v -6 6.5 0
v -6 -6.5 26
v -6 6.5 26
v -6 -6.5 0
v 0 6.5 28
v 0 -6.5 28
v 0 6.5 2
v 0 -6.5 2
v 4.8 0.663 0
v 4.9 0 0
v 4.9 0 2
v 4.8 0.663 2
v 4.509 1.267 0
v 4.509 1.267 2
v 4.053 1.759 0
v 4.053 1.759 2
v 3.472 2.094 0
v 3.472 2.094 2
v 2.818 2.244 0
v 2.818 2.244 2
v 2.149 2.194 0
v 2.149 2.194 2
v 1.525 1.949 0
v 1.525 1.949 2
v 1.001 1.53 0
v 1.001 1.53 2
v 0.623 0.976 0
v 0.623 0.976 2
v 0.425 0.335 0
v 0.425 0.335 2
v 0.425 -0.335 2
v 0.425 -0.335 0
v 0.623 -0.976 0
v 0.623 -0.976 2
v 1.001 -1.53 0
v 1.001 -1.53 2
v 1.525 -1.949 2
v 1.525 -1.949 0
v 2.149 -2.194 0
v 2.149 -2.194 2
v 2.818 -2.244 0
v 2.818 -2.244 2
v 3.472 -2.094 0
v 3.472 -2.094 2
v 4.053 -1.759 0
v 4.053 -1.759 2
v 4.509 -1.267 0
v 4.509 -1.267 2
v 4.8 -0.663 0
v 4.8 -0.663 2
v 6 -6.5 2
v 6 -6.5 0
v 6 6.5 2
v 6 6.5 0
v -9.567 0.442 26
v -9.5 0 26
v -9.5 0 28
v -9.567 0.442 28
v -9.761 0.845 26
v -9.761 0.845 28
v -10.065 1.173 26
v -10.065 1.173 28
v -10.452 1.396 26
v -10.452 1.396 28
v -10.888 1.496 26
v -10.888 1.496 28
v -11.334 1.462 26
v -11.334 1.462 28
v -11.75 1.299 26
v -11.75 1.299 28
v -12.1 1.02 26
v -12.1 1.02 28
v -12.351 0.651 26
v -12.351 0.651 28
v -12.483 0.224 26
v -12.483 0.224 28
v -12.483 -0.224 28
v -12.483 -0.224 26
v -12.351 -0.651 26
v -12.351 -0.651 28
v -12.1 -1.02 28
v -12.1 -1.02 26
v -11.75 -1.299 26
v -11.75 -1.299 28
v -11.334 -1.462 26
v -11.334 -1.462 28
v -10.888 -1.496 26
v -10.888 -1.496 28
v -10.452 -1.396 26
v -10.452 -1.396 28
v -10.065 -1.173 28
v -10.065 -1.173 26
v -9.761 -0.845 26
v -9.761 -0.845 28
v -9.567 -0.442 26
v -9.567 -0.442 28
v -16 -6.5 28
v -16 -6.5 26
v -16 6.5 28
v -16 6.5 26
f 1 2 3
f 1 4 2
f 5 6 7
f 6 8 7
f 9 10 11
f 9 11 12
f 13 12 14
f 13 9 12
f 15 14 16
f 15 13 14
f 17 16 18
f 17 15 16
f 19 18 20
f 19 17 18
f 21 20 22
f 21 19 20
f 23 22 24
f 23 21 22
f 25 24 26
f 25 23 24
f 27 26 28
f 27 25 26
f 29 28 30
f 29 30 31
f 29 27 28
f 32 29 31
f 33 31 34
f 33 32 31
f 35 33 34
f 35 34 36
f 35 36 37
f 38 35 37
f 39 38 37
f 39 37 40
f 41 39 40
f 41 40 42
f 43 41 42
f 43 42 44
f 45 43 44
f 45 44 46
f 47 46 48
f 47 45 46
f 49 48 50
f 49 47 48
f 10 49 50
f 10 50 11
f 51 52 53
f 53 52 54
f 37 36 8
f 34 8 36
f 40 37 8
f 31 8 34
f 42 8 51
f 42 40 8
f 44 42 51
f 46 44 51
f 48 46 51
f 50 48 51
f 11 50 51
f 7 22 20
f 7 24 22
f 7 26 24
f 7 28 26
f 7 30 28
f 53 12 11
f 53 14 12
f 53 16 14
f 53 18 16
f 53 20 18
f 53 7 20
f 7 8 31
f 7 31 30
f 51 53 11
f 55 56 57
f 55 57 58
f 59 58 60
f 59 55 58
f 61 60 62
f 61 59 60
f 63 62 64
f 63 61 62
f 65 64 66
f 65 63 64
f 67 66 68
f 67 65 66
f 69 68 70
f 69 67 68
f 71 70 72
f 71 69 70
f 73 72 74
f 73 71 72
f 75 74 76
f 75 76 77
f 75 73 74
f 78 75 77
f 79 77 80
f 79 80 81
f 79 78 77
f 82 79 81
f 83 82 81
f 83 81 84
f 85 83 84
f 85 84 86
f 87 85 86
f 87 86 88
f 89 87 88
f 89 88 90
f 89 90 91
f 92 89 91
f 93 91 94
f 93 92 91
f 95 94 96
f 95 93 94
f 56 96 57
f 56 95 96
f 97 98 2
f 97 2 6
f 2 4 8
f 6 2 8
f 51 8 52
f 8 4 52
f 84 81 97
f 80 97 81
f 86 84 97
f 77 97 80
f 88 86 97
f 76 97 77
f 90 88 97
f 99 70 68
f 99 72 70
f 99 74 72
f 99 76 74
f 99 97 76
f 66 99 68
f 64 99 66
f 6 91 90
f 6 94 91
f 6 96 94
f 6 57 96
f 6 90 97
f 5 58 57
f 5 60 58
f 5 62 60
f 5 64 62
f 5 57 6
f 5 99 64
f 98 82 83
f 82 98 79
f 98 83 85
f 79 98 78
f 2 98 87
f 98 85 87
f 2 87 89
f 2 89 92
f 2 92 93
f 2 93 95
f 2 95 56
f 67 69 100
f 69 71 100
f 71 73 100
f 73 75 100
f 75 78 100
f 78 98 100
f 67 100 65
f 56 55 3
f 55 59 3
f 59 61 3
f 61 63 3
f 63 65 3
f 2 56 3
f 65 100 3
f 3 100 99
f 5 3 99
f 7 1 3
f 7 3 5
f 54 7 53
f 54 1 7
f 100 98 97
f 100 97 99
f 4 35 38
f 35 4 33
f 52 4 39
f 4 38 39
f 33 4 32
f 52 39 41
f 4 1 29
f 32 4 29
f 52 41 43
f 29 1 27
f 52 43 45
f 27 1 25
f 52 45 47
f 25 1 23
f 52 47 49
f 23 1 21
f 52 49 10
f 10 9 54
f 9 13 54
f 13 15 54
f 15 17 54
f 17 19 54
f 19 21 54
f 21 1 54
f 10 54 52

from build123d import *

# Parameters (mm, degrees)
SZKIC1_W                    = 12
SZKIC1_H                    = 13
SZKIC1_R                    = 2.25
DODANIE_WYCI_GNI_CIE1_DEPTH = 2
SZKIC2_W                    = 6
SZKIC2_H                    = 13
DODANIE_WYCI_GNI_CIE2_DEPTH = 24
SZKIC3_W                    = 16
SZKIC3_H                    = 13
SZKIC3_R                    = 1.5
DODANIE_WYCI_GNI_CIE3_DEPTH = 2


with BuildPart() as part:
    # Szkic1 → Dodanie-wyciągnięcie1 (new body)
    with BuildSketch(Plane.XY):
        Rectangle(SZKIC1_W, SZKIC1_H)
        with Locations((2.65, 0)):
            Circle(SZKIC1_R, mode=Mode.SUBTRACT)
    extrude(amount=DODANIE_WYCI_GNI_CIE1_DEPTH)

    # Szkic2 → Dodanie-wyciągnięcie2 (add)
    with BuildSketch(Plane.XY.offset(2)):
        with Locations((-3, 0)):
            Rectangle(SZKIC2_W, SZKIC2_H)
    extrude(amount=DODANIE_WYCI_GNI_CIE2_DEPTH)

    # Szkic3 → Dodanie-wyciągnięcie3 (add)
    with BuildSketch(Plane.XY.offset(26)):
        with Locations((-8, 0)):
            Rectangle(SZKIC3_W, SZKIC3_H)
        with Locations((-11, 0)):
            Circle(SZKIC3_R, mode=Mode.SUBTRACT)
    extrude(amount=DODANIE_WYCI_GNI_CIE3_DEPTH)


solid = part.part
